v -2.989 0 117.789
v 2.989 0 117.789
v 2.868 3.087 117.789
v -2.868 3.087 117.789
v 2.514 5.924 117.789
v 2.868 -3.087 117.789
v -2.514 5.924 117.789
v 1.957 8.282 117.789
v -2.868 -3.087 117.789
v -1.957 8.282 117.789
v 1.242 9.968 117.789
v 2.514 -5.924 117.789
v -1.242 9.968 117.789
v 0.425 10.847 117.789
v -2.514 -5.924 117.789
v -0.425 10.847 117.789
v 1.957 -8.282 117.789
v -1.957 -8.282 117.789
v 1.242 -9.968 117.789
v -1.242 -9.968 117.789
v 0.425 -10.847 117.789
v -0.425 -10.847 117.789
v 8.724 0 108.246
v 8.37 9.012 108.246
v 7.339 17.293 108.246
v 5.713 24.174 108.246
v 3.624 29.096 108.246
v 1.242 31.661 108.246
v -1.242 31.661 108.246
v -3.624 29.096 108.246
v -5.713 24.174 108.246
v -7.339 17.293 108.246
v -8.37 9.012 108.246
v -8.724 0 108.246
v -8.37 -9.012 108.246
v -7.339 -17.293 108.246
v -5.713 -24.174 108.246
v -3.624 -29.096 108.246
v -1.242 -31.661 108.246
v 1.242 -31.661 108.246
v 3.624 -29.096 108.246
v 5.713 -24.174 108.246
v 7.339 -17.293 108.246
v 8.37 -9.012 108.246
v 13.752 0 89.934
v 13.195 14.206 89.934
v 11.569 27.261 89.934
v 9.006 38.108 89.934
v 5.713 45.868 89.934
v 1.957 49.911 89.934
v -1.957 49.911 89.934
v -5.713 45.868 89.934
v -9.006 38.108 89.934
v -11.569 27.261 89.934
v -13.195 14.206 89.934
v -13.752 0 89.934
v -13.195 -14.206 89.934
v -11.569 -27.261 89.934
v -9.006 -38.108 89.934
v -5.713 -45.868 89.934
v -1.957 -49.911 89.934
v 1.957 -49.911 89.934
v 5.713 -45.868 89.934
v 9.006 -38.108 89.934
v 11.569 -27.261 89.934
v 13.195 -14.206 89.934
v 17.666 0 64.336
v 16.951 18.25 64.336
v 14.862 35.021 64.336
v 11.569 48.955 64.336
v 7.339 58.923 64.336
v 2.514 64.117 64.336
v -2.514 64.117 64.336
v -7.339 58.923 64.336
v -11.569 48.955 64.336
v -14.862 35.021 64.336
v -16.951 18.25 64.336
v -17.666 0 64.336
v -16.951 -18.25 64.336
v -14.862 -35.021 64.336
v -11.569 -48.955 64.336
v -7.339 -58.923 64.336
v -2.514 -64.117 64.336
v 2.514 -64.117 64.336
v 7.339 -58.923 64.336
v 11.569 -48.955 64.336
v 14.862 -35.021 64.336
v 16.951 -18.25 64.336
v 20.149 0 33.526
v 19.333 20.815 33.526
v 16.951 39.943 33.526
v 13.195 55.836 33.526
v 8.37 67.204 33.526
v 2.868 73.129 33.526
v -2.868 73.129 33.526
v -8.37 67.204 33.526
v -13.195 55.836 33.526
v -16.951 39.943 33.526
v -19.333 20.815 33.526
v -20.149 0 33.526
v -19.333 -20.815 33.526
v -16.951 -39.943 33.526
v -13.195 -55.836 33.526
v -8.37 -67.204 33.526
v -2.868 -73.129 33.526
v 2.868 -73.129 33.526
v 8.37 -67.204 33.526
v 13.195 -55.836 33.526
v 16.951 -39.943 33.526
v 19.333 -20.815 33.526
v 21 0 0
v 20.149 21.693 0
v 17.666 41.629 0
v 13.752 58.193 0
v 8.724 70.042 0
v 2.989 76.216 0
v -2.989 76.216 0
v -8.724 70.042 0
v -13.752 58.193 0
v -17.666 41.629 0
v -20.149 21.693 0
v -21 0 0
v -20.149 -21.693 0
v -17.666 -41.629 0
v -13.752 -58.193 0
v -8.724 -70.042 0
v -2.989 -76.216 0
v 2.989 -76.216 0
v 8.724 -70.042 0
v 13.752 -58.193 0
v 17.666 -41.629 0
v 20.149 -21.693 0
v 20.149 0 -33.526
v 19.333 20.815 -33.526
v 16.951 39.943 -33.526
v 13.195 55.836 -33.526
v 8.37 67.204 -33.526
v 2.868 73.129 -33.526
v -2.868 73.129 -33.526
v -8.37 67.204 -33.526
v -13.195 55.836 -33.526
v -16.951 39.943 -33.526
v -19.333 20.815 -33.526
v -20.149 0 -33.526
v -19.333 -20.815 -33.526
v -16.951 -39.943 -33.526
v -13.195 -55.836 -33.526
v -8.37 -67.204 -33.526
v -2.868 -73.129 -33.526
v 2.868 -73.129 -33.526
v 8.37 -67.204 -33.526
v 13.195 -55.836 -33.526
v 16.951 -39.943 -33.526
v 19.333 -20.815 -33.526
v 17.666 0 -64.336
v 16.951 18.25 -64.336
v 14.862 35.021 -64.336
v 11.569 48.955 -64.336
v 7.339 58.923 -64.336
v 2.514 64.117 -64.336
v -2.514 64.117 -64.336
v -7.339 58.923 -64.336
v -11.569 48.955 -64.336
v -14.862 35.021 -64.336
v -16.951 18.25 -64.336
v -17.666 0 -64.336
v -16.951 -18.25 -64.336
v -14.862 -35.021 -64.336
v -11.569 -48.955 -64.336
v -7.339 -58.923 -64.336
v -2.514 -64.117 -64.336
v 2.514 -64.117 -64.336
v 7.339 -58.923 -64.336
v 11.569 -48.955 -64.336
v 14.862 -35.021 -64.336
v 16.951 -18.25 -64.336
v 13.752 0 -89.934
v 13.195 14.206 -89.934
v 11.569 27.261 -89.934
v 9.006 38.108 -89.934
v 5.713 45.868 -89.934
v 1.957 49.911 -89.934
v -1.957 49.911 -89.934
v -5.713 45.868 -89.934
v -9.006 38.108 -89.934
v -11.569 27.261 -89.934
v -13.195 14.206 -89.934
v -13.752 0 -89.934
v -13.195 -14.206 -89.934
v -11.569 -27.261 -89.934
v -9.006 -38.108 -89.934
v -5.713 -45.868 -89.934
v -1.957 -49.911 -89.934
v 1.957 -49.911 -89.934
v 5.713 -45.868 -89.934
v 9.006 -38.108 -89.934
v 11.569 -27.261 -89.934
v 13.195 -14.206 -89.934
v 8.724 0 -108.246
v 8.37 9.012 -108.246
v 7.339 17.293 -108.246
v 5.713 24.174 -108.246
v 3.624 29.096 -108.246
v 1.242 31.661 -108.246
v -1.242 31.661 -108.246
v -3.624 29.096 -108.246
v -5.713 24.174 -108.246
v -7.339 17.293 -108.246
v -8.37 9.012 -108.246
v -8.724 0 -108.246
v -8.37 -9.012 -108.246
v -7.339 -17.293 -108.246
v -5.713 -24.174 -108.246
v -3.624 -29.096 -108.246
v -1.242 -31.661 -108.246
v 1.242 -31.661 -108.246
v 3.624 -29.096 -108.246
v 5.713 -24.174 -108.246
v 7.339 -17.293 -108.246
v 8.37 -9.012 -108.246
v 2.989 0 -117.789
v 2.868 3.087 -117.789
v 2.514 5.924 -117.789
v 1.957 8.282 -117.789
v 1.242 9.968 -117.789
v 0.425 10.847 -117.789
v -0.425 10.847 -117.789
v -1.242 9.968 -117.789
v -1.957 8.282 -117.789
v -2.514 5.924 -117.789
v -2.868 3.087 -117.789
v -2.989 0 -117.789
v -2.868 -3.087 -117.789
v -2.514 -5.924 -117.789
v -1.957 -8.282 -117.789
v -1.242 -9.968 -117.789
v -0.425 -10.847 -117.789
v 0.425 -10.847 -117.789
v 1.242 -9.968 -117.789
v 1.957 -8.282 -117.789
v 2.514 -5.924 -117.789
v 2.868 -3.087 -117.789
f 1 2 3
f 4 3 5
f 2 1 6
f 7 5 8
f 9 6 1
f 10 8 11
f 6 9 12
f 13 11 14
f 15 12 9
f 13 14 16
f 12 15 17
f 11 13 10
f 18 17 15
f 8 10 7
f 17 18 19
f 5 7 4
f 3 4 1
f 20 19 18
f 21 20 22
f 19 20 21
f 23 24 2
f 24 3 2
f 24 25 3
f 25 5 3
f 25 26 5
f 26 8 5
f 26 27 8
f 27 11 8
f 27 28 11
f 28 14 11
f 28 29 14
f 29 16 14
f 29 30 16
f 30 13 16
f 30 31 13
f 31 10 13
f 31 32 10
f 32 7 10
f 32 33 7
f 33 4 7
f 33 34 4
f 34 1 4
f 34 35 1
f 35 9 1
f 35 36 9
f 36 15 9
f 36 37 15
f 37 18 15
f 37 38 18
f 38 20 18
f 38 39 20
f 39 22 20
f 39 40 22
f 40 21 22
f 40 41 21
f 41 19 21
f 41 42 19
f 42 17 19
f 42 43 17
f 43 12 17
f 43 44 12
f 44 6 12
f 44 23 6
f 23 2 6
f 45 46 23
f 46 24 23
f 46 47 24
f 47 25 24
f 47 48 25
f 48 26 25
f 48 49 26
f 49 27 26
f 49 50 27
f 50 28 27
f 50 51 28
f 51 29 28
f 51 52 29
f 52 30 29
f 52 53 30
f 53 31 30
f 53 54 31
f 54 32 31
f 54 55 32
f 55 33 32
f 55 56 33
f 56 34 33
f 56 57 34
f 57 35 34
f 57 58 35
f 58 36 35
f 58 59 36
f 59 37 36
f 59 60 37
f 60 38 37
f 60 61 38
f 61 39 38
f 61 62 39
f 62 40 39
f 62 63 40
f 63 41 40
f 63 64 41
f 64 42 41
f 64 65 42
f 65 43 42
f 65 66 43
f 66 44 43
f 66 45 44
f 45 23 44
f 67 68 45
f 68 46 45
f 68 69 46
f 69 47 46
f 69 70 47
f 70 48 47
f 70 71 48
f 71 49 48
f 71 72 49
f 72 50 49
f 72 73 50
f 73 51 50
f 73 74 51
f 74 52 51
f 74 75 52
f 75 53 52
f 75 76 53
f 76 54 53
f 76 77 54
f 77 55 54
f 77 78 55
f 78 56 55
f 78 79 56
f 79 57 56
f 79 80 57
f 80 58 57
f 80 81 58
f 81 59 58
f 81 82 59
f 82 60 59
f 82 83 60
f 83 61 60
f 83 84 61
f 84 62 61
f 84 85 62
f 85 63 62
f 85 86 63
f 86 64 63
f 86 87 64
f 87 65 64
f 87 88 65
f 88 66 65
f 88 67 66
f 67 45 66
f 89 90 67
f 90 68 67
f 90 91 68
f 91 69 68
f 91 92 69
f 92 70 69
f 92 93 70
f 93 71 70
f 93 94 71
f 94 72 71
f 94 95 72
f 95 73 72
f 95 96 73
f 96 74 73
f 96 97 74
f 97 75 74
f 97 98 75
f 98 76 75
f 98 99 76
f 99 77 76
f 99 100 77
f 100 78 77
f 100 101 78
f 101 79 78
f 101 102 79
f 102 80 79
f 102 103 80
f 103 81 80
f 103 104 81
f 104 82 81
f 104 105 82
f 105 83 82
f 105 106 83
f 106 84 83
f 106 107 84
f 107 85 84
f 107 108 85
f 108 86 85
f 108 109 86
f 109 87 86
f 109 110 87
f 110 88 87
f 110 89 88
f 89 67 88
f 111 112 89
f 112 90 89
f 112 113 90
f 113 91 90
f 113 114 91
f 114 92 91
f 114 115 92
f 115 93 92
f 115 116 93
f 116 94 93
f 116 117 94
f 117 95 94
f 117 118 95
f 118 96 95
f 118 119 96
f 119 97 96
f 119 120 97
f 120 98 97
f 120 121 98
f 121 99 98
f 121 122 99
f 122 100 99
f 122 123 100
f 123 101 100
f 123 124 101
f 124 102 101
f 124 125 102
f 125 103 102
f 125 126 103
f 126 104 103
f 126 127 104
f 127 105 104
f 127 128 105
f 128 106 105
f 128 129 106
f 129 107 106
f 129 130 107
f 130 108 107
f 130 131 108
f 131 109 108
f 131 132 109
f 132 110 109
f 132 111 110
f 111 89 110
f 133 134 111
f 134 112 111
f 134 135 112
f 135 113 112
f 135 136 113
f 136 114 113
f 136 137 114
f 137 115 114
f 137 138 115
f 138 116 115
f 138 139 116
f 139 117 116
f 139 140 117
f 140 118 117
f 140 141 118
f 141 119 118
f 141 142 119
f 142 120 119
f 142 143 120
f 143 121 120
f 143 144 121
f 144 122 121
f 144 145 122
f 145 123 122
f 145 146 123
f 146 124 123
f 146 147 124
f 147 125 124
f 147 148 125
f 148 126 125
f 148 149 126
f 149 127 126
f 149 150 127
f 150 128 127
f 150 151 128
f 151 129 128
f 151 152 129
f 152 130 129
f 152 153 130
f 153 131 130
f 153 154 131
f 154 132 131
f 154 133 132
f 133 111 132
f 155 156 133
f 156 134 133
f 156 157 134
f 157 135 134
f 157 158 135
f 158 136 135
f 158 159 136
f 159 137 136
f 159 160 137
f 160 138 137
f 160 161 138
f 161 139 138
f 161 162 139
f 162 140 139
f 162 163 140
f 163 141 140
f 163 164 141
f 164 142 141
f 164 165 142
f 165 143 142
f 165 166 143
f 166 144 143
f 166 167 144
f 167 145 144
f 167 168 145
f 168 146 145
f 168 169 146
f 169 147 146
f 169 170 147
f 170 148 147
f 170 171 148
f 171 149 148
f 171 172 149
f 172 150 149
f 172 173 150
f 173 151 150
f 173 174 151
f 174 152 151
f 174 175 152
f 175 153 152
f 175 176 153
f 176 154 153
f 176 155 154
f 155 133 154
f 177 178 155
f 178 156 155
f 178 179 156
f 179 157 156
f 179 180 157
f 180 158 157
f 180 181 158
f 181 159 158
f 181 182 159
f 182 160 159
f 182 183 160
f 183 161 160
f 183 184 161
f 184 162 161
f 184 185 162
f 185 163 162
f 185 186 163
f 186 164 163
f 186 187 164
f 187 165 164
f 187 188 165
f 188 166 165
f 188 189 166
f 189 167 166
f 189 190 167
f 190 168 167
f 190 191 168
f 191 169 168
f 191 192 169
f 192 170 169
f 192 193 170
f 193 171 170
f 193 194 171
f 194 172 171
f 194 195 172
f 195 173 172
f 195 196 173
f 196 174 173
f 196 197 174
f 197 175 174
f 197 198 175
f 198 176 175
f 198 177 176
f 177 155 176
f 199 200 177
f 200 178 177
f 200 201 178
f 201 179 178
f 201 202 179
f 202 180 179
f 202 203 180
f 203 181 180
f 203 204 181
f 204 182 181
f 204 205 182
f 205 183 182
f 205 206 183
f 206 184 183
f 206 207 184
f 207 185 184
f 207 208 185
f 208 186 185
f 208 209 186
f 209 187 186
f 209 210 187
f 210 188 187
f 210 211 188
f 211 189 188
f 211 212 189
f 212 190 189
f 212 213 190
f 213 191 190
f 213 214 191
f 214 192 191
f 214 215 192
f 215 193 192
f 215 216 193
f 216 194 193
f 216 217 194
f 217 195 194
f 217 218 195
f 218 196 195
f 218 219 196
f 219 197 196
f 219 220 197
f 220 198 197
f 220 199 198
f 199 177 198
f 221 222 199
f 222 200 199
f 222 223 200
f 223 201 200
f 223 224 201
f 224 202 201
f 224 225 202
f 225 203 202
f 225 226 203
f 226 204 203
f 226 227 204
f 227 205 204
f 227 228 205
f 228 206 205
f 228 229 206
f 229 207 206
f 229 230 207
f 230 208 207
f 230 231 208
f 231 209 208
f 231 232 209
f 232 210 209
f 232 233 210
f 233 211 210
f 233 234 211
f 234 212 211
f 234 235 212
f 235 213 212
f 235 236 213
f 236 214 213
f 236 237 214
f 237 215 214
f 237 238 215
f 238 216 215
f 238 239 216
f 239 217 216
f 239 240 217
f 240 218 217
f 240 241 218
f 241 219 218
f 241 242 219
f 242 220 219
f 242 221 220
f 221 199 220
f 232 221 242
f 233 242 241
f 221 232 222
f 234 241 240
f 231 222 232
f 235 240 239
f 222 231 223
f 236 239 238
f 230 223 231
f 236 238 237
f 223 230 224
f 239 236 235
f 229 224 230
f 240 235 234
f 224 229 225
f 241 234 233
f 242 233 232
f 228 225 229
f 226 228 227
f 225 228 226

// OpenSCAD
// Generated by SolidPython 1.0.1 on 2020-07-29 00:46:45


scale(v = [3, 11, 17]) {
	sphere(r = 7);
}
/***********************************************
*********      SolidPython code:      **********
************************************************
 
# import packages: SolidPython
from solid import *
from solid.utils import *
from itertools import chain, combinations, permutations


class Resize:

    def __init__(self, scad_file):
        self.scad_file = scad_file
        #self.scad_file = import_scad(scad_file)
        # cone/cylinder param:
        self.r1 = 0
        self.r2 = 0
        self.h = 0
        # rectangular prism param:
        self.w = 0
        self.l = 0
        # ellipse param:
        self.r = 0

    # import OpenScad code (file name corresponds to shape)


    # classify shape + parameters
    def assign(self, param1, param2, param3):
        if self.scad_file == 'cone.scad':
            self.r1 = param1
            self.r2 = param2
            self.h = param3
        elif self.scad_file == 'cylinder.scad':
            self.r1 = param1
            self.r2 = param2
            self.h = param3
        elif self.scad_file == 'rectangularPrism.scad':
            self.h = param1
            self.l = param2
            self.w = param3
        else:
            self.r = param1
            self.h = param2

    # resize parameters
    def iterate(self):
        x = range(3, 20, 2)
        i = 1
        if self.scad_file == 'cone.scad':
            tempList = list(permutations(x, 2))
            for temp in tempList:
                param1 = temp[0]
                param2 = temp[1]
                filepath = 'produced_scad_files/' + 'cone' + str(param1) + '_' + str(param2) + '_' + '.scad'
                scad_render_to_file(cylinder(h=param1, r1=param2, r2=0), filepath)

        elif self.scad_file == 'cylinder.scad':
            tempList = list(permutations(x, 3))
            for temp in tempList:
                param1 = temp[0]
                param2 = temp[1]
                filepath = 'produced_scad_files/' + 'cylinder' + str(param1) + '_' + str(param2) + '_' + '.scad'
                scad_render_to_file(cylinder(h=param1, r1=param2, r2=param2), filepath)

        elif self.scad_file == 'rectangularPrism.scad':
            tempList = list(permutations(x, 3))
            for temp in tempList:
                param1 = temp[0]
                param2 = temp[1]
                param3 = temp[2]
                filepath = 'produced_scad_files/' + 'rectangularPrism' + str(param1) + '_' + str(param2) + '_' + str(
                    param3) + '.scad'
                scad_render_to_file(cube(size=(param1, param2, param3)), filepath)

        elif self.scad_file == 'ellipse.scad':
            tempList = list(permutations(x, 4))
            for temp in tempList:
                param1 = temp[0]
                param2 = temp[1]
                param3 = temp[2]
                param4 = temp[3]
                filepath = 'produced_scad_files/' + 'ellipse' + str(param1) + '_' + str(param2) + '_' + str(param3) + '_' + str(param4) + '.scad'
                scad_render_to_file(scale([param1, param2, param3])(sphere(r=param4)), filepath)

    def render_to_scadfile(self):
        scad_render_to_file(scad, 'example.scad') 
 
************************************************/
